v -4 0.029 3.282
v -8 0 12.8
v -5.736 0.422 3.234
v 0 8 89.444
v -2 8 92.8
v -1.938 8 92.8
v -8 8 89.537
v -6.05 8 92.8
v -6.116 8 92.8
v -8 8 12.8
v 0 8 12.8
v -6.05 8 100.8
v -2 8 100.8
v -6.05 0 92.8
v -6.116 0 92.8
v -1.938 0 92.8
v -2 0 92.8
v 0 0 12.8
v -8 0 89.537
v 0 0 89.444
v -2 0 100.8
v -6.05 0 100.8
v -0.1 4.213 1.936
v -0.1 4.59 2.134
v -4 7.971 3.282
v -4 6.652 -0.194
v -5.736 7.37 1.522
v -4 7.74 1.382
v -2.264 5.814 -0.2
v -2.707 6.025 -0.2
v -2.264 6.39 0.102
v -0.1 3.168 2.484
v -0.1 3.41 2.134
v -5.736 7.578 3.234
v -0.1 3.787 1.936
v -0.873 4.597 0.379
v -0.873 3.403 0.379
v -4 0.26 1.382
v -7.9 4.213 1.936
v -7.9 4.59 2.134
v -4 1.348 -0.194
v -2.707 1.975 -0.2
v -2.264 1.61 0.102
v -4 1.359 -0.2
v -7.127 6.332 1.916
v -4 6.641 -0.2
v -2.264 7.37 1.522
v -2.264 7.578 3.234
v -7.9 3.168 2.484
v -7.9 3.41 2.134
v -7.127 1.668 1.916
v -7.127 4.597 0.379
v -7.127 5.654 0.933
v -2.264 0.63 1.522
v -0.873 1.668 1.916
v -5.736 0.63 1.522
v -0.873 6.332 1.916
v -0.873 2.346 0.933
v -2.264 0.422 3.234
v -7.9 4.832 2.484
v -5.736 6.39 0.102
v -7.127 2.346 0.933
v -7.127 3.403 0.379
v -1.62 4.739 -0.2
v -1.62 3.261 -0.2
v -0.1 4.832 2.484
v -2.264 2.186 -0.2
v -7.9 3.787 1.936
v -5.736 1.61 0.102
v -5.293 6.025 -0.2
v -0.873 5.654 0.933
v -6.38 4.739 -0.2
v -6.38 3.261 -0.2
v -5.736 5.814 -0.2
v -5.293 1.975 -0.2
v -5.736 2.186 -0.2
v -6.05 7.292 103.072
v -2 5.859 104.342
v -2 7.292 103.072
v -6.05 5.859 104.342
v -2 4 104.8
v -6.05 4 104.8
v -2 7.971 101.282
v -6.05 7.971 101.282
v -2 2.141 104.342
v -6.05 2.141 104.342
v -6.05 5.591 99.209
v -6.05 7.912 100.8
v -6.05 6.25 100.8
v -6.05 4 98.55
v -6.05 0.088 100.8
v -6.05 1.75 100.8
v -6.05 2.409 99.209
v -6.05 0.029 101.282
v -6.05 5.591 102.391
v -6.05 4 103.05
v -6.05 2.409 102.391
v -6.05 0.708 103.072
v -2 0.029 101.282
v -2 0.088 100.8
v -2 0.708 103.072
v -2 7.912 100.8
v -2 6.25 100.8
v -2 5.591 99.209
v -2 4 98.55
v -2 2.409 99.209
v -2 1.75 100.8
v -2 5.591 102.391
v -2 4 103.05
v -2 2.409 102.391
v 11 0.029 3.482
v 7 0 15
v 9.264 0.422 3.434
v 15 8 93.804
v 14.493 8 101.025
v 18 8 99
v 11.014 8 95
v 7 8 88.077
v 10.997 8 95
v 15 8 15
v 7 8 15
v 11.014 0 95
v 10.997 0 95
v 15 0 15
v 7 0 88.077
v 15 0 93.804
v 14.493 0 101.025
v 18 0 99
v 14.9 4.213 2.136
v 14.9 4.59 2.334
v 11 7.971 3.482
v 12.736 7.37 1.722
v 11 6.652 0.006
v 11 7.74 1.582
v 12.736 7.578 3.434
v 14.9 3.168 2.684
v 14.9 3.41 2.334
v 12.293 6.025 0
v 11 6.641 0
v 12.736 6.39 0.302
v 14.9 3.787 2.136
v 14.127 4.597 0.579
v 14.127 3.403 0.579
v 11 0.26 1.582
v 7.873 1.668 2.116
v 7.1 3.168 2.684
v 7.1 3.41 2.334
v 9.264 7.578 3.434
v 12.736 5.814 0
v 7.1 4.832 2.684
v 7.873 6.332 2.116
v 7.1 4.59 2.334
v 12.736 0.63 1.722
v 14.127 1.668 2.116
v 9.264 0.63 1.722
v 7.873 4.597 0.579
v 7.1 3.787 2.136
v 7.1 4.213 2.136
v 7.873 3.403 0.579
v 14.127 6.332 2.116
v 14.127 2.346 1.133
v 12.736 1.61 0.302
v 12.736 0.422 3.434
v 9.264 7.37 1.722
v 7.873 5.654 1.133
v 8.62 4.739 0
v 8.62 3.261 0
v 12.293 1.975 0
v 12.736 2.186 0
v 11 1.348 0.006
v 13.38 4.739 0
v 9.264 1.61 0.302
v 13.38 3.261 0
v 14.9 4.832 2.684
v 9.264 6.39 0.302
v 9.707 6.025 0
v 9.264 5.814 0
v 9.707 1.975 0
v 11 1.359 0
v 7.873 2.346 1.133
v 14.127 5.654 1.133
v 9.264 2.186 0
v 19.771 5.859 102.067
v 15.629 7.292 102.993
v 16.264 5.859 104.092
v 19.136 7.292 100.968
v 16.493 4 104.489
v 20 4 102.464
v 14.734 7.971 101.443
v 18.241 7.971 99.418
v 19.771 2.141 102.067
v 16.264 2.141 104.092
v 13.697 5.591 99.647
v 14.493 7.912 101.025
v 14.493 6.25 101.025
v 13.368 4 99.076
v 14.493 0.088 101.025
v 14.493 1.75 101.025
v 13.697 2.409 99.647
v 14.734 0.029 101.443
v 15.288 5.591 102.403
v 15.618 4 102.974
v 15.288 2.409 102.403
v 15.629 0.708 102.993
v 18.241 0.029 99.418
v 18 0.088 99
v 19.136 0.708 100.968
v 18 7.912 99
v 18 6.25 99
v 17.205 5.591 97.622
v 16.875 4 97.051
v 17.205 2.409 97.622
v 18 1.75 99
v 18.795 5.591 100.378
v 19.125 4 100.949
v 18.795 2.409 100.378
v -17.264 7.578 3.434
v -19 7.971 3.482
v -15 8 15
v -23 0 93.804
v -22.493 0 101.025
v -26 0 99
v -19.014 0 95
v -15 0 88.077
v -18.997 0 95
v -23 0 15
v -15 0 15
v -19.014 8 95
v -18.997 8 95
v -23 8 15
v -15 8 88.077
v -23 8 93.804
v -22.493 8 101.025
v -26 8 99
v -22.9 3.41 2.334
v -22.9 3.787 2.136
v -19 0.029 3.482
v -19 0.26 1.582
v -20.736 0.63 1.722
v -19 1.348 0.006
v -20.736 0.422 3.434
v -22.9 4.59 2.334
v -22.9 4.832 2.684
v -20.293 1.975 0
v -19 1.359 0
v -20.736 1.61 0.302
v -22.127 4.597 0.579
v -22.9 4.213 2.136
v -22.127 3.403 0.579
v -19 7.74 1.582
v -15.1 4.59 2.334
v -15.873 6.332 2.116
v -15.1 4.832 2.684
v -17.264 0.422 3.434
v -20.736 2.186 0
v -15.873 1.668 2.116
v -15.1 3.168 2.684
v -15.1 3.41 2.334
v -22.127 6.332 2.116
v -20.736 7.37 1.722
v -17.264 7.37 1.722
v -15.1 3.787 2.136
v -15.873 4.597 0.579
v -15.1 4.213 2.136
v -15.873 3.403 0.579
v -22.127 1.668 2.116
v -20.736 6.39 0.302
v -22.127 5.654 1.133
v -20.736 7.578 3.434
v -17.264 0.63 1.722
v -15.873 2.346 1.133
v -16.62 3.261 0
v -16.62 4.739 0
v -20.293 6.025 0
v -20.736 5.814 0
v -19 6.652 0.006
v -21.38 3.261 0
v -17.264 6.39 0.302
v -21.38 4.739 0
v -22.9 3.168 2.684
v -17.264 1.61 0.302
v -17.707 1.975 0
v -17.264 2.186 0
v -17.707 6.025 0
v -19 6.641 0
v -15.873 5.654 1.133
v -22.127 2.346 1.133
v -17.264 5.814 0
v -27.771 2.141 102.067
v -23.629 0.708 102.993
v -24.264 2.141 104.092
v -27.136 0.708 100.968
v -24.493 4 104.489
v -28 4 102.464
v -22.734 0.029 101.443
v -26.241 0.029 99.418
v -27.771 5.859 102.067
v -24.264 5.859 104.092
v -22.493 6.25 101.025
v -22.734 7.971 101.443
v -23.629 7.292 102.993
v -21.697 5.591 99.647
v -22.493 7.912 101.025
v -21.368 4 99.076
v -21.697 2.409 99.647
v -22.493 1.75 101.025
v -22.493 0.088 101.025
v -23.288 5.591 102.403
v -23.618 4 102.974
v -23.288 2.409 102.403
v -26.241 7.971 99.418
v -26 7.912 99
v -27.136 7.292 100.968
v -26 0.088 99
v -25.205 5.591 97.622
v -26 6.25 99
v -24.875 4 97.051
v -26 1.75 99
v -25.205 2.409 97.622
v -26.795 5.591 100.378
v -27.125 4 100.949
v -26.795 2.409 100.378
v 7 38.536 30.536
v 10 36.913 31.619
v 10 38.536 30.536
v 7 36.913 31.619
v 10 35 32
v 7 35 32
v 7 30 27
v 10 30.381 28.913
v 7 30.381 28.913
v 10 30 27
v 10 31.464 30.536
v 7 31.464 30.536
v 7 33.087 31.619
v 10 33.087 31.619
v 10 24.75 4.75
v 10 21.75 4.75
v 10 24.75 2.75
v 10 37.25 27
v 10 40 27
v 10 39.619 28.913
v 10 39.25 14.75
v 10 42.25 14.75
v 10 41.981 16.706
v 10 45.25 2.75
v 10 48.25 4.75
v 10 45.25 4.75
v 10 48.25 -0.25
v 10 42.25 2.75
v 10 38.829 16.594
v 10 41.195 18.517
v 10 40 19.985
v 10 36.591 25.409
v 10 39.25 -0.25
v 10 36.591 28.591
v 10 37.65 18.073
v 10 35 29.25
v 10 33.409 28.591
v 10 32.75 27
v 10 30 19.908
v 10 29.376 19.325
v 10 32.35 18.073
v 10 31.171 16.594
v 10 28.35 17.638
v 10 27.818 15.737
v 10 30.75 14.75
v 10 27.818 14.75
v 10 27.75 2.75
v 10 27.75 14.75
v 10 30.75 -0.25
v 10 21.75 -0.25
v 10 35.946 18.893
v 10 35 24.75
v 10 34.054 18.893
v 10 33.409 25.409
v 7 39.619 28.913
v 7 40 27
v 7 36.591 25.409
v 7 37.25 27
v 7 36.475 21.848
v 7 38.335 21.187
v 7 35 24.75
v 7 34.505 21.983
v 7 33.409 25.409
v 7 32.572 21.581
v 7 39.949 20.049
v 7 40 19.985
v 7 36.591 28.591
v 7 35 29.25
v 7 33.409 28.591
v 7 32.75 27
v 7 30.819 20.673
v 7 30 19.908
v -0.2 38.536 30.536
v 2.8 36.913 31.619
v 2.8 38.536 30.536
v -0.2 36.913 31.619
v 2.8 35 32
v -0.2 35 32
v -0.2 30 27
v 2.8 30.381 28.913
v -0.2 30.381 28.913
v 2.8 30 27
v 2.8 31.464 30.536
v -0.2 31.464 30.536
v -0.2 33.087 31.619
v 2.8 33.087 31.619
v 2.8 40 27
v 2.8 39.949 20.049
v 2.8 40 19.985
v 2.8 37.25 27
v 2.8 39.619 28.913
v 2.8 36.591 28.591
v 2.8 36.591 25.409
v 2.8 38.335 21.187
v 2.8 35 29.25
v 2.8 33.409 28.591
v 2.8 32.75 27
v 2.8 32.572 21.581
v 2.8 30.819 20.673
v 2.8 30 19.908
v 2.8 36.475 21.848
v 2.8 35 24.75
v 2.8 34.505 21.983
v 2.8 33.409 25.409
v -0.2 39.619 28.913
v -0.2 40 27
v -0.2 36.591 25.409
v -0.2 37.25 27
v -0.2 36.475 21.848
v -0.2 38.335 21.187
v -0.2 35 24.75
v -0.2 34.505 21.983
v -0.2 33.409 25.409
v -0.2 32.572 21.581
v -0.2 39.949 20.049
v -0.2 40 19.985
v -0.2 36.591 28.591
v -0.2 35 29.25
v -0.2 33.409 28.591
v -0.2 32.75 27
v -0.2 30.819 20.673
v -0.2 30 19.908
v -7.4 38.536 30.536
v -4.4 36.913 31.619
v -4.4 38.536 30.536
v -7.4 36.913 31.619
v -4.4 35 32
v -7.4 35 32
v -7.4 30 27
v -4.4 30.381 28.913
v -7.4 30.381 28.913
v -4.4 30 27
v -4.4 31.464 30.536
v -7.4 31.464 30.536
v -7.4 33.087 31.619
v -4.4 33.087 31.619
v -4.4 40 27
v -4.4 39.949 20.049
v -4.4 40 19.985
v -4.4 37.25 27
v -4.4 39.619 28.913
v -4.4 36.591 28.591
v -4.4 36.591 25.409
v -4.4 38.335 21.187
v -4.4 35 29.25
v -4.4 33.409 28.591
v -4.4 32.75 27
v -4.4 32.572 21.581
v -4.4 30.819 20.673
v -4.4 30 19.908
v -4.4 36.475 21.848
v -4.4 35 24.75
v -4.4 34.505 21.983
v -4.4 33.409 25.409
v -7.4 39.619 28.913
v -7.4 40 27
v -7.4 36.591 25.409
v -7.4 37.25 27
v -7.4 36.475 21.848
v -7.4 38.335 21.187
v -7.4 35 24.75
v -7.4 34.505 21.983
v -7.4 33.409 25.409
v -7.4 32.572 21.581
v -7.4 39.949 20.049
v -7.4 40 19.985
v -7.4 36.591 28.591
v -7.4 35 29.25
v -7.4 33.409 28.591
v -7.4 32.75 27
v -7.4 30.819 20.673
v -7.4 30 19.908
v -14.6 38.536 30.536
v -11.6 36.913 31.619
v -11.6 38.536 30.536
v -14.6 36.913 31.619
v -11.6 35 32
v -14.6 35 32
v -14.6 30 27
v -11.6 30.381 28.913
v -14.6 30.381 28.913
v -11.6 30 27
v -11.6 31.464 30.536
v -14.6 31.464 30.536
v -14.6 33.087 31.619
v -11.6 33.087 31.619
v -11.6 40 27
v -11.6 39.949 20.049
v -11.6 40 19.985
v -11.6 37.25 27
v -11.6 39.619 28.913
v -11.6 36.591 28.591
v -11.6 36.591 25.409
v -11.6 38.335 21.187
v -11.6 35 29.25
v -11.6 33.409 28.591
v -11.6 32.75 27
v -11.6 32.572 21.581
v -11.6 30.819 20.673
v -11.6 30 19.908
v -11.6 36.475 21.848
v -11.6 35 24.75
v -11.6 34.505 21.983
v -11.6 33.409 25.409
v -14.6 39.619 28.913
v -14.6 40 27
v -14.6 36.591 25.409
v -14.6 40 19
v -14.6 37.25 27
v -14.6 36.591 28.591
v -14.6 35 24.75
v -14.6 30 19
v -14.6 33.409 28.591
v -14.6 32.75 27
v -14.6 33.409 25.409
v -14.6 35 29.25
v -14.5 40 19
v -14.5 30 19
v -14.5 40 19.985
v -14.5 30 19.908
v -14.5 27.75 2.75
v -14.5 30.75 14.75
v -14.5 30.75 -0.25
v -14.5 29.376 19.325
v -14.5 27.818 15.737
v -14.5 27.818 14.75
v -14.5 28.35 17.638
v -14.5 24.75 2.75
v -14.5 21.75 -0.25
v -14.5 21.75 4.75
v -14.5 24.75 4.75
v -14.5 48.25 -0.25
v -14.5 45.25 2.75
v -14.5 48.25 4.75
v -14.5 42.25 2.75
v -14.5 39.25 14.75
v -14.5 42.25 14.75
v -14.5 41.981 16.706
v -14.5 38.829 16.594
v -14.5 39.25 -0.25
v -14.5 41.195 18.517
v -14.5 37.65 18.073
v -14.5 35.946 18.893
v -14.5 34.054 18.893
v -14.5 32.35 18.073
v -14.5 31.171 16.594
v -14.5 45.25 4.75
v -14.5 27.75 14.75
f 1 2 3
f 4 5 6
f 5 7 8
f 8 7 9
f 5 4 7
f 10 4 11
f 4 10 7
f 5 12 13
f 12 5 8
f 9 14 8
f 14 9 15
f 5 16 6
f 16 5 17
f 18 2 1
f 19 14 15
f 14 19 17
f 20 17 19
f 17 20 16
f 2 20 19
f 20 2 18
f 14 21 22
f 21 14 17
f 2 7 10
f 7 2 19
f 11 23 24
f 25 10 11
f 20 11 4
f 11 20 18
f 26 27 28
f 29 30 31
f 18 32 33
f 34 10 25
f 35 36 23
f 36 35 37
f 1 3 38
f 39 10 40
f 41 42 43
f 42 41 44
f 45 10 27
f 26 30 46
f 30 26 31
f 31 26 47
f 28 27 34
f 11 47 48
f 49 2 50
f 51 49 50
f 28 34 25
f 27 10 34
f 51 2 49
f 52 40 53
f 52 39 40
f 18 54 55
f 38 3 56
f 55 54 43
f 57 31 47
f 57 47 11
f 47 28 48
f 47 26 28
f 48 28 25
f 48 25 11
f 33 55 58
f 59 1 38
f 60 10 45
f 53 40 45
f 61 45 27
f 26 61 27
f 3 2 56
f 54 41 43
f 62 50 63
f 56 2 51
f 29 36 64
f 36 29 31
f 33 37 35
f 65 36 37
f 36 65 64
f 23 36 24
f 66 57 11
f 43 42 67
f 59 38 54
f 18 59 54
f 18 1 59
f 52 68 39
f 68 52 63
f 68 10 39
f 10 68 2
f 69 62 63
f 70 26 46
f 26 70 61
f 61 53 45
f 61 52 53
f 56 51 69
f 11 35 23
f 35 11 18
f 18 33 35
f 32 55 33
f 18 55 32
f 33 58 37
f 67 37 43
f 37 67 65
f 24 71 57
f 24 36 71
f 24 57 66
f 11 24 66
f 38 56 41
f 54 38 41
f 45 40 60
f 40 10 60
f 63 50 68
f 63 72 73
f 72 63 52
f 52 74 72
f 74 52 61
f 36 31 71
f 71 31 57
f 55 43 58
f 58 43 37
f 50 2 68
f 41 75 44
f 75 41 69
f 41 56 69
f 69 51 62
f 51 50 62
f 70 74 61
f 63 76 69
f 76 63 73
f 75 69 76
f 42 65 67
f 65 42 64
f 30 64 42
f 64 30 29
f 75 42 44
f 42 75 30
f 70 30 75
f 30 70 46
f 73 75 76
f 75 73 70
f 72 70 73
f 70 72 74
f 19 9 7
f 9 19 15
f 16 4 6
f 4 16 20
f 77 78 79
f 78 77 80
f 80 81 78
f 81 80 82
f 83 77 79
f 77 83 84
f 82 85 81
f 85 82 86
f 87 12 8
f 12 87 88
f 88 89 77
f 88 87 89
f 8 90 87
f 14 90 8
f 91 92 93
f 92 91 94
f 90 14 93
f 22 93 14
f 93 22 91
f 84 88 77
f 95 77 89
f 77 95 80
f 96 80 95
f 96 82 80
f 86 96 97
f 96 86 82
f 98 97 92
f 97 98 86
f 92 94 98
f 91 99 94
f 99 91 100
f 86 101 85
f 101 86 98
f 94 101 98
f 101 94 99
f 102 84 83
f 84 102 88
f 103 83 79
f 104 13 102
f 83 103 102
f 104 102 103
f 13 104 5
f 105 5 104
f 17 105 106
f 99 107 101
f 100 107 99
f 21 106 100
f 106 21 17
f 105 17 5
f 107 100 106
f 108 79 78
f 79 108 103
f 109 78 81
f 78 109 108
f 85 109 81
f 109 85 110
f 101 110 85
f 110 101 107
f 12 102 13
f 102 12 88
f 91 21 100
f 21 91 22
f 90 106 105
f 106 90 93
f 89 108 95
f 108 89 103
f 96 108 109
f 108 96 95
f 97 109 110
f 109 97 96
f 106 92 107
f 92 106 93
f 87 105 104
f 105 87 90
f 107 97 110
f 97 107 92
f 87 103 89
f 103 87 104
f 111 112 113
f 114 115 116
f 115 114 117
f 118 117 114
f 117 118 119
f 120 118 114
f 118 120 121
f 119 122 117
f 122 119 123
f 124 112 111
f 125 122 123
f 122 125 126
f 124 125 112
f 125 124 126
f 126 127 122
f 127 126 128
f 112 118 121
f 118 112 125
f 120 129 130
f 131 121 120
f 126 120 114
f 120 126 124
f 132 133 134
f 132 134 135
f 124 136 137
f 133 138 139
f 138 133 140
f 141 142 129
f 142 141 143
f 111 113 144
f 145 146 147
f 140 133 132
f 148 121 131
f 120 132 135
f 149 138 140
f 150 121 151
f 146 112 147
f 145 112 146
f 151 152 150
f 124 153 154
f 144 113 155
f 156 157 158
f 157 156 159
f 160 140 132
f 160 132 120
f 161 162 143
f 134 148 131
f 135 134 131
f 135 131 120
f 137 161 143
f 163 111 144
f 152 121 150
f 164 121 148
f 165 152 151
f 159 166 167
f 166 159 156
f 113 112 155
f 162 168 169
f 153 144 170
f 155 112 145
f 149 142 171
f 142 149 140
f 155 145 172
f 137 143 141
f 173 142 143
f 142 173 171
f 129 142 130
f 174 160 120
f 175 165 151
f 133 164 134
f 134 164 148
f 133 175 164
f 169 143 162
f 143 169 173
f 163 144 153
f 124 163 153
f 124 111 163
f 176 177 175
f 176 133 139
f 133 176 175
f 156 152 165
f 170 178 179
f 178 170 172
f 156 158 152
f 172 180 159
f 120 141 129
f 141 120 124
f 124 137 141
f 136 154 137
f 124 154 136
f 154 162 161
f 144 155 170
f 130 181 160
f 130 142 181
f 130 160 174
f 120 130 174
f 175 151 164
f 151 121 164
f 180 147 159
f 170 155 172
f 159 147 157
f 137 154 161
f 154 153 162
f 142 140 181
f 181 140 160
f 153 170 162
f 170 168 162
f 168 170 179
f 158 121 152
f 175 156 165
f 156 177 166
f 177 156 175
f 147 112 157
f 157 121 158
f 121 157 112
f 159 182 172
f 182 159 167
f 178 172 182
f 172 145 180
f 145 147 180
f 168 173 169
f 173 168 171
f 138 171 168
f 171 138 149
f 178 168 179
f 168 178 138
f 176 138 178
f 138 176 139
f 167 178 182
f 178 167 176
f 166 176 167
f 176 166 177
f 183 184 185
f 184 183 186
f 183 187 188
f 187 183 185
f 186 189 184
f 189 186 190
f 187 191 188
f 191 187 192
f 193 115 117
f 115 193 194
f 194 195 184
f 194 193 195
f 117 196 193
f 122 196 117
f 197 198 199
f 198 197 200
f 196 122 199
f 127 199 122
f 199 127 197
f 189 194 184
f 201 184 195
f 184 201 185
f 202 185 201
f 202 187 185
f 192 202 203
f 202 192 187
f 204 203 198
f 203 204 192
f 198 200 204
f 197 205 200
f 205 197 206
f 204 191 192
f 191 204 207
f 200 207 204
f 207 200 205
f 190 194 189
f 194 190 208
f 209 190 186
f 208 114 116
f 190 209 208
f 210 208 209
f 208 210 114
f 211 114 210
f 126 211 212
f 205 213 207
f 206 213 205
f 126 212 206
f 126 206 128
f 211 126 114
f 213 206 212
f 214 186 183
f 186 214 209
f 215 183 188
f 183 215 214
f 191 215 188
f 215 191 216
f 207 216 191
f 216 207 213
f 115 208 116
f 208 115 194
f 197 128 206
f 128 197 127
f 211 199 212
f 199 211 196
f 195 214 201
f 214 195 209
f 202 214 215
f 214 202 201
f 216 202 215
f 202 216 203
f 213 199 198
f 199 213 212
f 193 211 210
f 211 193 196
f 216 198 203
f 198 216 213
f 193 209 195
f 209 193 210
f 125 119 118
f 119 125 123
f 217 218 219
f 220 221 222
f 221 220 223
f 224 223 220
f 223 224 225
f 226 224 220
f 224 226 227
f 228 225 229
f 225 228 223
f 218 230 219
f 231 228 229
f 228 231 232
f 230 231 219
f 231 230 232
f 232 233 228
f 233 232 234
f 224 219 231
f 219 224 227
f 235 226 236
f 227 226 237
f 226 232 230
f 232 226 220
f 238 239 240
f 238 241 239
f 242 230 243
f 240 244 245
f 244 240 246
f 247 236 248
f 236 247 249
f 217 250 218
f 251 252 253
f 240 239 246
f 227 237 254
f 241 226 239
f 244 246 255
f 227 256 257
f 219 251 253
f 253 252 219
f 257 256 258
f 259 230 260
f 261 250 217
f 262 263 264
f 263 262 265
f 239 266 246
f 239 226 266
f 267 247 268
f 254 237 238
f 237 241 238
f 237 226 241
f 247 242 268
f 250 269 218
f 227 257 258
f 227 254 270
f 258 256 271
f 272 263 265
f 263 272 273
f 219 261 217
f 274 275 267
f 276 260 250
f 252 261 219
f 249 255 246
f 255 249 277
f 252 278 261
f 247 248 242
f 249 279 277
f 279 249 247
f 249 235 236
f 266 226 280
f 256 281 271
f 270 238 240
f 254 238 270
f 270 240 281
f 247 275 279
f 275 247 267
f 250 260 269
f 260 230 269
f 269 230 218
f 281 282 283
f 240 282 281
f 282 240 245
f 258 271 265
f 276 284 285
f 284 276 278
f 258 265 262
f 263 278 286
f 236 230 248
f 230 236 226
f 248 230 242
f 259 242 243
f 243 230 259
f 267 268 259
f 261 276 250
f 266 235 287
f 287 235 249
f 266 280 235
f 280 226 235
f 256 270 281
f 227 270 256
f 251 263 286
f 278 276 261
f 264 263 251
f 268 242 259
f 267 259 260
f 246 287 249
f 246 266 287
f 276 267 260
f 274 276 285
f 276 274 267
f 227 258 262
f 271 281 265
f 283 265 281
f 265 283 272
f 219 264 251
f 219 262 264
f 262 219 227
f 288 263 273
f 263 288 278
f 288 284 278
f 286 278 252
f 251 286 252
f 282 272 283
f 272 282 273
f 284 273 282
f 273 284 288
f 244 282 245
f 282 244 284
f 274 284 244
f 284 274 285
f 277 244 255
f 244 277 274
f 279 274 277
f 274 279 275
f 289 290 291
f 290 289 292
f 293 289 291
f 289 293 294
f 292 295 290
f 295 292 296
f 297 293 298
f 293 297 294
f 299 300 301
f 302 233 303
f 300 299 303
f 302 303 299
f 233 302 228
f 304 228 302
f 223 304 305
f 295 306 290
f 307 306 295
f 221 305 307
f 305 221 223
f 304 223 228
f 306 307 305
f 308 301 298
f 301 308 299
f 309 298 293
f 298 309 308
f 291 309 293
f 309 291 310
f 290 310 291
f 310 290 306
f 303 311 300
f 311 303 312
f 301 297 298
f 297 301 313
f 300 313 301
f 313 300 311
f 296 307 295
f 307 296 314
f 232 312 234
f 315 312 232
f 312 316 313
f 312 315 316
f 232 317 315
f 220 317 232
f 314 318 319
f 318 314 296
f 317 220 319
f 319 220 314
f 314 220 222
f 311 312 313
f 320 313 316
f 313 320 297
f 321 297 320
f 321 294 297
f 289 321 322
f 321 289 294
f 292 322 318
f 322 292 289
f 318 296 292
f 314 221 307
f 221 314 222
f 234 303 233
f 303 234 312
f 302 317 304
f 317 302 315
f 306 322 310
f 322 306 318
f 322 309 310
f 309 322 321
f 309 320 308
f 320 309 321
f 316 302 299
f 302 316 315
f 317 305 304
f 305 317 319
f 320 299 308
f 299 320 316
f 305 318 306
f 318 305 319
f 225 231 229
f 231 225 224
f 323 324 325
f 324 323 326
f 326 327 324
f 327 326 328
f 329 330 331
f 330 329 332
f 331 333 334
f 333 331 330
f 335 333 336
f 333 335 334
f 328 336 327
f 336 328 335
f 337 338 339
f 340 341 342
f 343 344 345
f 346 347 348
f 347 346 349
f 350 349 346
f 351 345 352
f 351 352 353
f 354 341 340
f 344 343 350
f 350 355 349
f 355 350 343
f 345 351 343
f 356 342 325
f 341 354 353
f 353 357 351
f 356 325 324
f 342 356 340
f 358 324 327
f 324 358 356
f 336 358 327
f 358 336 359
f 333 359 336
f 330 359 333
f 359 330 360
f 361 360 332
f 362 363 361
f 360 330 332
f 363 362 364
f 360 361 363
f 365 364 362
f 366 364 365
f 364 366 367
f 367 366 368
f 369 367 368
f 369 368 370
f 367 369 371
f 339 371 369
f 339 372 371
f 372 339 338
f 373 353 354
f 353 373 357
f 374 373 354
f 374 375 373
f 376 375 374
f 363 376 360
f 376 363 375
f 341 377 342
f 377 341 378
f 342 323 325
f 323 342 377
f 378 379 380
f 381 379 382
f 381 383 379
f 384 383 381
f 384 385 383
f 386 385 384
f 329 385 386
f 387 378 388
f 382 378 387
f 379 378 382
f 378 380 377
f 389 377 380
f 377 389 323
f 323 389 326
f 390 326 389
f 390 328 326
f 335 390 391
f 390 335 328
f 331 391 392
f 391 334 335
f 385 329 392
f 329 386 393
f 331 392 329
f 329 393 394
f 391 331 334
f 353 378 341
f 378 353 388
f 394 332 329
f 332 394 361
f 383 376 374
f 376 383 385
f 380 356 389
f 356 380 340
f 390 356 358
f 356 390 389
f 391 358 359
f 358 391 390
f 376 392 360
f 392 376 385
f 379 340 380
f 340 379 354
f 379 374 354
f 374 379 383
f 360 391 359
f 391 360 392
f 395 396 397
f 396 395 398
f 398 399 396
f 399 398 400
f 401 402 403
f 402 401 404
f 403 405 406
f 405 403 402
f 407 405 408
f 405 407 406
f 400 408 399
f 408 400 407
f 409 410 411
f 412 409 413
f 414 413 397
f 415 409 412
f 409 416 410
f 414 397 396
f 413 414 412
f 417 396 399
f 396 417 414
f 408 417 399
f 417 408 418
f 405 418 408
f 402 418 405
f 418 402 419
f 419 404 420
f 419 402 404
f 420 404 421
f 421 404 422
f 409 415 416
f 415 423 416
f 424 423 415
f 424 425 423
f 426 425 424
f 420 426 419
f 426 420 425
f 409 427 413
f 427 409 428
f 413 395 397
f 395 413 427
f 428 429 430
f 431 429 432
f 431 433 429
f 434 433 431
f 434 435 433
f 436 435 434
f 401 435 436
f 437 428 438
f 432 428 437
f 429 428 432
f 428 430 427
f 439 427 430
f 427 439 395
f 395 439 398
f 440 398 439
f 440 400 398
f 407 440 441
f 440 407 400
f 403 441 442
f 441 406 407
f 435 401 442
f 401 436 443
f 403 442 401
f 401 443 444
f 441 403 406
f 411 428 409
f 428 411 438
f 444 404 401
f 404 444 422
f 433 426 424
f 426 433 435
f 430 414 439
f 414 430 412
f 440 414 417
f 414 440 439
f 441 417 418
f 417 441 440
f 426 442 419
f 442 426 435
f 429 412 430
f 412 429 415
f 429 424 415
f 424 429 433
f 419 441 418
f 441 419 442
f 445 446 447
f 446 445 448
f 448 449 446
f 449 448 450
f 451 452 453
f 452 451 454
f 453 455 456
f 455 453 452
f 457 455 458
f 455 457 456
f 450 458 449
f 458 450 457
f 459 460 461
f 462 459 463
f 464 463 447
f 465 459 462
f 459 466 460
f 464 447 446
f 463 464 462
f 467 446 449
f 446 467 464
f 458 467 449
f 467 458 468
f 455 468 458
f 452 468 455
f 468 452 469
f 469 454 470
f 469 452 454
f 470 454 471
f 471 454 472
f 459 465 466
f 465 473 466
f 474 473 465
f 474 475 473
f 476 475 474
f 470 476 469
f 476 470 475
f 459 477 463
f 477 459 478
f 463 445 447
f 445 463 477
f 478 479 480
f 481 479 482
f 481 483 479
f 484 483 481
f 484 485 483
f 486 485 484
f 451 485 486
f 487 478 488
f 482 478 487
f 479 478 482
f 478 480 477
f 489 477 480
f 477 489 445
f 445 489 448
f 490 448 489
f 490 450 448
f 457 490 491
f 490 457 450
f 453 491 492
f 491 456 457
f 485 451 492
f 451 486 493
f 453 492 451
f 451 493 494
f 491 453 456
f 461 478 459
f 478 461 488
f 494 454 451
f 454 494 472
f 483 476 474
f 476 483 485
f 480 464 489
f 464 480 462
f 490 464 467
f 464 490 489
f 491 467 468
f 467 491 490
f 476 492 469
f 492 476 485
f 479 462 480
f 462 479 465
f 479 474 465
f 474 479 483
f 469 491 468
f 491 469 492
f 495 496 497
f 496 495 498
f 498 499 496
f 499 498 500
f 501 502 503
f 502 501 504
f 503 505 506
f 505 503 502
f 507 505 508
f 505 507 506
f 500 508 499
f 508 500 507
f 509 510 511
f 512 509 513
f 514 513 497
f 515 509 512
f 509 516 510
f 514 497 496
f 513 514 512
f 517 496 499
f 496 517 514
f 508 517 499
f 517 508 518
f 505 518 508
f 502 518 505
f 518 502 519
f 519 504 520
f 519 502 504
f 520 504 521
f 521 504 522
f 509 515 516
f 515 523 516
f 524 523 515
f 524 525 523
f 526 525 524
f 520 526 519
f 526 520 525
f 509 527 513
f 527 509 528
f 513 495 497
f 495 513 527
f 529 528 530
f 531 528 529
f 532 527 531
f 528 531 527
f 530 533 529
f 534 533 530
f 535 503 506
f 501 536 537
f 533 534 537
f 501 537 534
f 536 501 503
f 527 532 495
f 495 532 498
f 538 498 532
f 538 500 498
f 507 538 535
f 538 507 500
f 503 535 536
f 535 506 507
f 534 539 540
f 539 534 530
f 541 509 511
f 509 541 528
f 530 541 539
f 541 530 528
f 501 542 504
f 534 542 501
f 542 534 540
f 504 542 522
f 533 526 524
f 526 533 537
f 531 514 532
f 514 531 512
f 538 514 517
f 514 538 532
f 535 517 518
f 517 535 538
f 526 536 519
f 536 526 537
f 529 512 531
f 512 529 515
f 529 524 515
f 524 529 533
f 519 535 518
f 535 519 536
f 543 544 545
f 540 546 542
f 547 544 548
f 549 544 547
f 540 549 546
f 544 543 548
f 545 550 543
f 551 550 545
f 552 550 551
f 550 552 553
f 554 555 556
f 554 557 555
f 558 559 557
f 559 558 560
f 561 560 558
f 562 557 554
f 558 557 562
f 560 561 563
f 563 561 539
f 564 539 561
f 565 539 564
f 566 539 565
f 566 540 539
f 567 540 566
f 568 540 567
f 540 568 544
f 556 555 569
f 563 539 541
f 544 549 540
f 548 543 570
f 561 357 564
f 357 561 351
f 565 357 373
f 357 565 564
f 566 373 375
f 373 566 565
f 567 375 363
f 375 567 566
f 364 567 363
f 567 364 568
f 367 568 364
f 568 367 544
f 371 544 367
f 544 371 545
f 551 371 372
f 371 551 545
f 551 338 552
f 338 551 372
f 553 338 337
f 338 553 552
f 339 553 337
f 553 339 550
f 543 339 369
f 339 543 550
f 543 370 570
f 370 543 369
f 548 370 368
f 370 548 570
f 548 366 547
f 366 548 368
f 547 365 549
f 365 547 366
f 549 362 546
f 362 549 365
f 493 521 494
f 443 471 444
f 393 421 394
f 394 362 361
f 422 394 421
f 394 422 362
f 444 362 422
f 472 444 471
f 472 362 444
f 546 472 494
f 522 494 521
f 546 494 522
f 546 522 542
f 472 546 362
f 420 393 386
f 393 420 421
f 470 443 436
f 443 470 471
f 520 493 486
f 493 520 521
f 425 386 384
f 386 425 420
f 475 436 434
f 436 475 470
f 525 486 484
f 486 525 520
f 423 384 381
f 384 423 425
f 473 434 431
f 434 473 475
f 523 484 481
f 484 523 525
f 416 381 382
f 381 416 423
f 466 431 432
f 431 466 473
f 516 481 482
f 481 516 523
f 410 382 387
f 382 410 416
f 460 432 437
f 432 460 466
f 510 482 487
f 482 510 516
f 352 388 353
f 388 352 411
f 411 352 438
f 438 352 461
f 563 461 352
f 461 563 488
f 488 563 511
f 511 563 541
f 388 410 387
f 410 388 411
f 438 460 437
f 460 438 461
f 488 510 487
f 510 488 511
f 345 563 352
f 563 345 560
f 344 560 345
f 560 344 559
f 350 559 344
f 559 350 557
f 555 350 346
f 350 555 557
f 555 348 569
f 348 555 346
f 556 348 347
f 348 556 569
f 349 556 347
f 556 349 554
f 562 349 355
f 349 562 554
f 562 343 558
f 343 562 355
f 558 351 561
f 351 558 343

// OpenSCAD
// base length of foot
footLength=80; // [50:150]

// height of iPhone 
iClampDia = 8.5; // [7:0.1:10]

// lenght of clip
iClampLen = 15; // [7:0.1:100]


module banner() {
}

bottomPlateSize=10;
bottomPlateWidth=8;
bottomPlateHeight=3;
holeDiameter=4.5;
iClampWidth = 3;
iClampHeight = 24.5;
plateSpace=4.2;
iRbHookWidth = 5;
footDiameter=8;

module bottomPlate(x=bottomPlateHeight, y=bottomPlateSize) {
  difference() {
    union() {
      cylinder (h=x, d=y);
      translate ([-bottomPlateWidth,-y/2,0]) cube ([bottomPlateWidth, y, x]);
    }   
    cylinder (h=x+0.2, d=holeDiameter);
  }
}

module clamp() {
  linear_extrude (height=iClampHeight) {
    translate ([-iClampDia/2,iClampDia/2+iClampWidth])
    difference() {
      union() {
        translate ([-iClampWidth,0]) square ([iClampWidth, iClampLen]);
        translate ([-2*iClampWidth, iClampLen - iClampWidth]) square ([iRbHookWidth, iClampWidth]);
        translate ([-3*iClampWidth, iClampLen - iRbHookWidth]) square ([iClampWidth, iRbHookWidth]);
        translate ([2*iClampWidth + iRbHookWidth - (8.5-iClampDia), iClampLen - iClampWidth]) square ([iRbHookWidth, iClampWidth]);
        translate ([3*iClampWidth + iRbHookWidth + 0.5 - (8.5-iClampDia), iClampLen - iRbHookWidth]) square ([iClampWidth, iRbHookWidth]);
        translate ([iClampDia/2,0])
        difference() {
          circle (iClampDia/2+iClampWidth);
          circle (iClampDia/2);
        }
        translate ([iClampDia,0]) square ([iClampWidth, iClampLen]);
      }
      square ([iClampDia,iClampHeight+iClampDia]);
    }
  }
}

module body() {
  translate ([-10,35,22])
  rotate ([0,270,0])
  union() {
    pom = bottomPlateSize;
    bottomPlate(y=pom);
    translate ([0,0,plateSpace+bottomPlateHeight]) bottomPlate(y=pom);
    translate ([0,0,2*(bottomPlateHeight+plateSpace)]) bottomPlate(y=pom);
    translate ([0,0,3*(bottomPlateHeight+plateSpace)]) bottomPlate(y=pom);
    translate ([-5,0,0]) rotate ([0,0,90]) clamp();
  }
}

module foot30() {
  translate ([0,0,15])
  rotate ([0,270,0])
  difference() {
    union() {
      difference() {
        hull() {
          cube ([footLength,footDiameter,footDiameter]);
          translate ([-12,footDiameter/2,footDiameter/2]) sphere (d=footDiameter);
        }
        translate ([-23,0,0]) cube ([footDiameter,footDiameter,footDiameter]);
      }
    
      translate ([footLength+4, footDiameter/2, -3]) rotate ([0,30,0]) bottomPlate (x=plateSpace-0.15,y=footDiameter);
    }
    translate ([60+(footLength-80), 0, 15.55]) rotate ([0,30,0]) cube ([30, 10, 10]);
  }
}

module foot() {
  translate ([0,0,12.8])
  rotate ([0,270,0])
  union() {
    difference() {
      hull() {
        cube ([footLength,footDiameter,footDiameter]);
        translate ([-10,footDiameter/2,footDiameter/2]) sphere (d=footDiameter);
      }
      translate ([-21,0,0]) cube ([footDiameter,footDiameter,footDiameter]);
      translate ([footLength-6.9, 0, 10.1]) rotate([0,30,0]) cube ([footDiameter,footDiameter,footDiameter]);
      translate ([footLength, 0, -7.3]) rotate([0,-30,0]) cube ([footDiameter,footDiameter,footDiameter]);
    }
    translate ([footLength+8, footDiameter/2, 2]) bottomPlate (x=plateSpace-0.15,y=footDiameter);
  }
}

foot();
translate ([15,0,0]) foot30();
translate ([-15-8,8,0]) rotate ([0,0,180]) foot30();
translate ([20,0,iClampLen-10]) body();
